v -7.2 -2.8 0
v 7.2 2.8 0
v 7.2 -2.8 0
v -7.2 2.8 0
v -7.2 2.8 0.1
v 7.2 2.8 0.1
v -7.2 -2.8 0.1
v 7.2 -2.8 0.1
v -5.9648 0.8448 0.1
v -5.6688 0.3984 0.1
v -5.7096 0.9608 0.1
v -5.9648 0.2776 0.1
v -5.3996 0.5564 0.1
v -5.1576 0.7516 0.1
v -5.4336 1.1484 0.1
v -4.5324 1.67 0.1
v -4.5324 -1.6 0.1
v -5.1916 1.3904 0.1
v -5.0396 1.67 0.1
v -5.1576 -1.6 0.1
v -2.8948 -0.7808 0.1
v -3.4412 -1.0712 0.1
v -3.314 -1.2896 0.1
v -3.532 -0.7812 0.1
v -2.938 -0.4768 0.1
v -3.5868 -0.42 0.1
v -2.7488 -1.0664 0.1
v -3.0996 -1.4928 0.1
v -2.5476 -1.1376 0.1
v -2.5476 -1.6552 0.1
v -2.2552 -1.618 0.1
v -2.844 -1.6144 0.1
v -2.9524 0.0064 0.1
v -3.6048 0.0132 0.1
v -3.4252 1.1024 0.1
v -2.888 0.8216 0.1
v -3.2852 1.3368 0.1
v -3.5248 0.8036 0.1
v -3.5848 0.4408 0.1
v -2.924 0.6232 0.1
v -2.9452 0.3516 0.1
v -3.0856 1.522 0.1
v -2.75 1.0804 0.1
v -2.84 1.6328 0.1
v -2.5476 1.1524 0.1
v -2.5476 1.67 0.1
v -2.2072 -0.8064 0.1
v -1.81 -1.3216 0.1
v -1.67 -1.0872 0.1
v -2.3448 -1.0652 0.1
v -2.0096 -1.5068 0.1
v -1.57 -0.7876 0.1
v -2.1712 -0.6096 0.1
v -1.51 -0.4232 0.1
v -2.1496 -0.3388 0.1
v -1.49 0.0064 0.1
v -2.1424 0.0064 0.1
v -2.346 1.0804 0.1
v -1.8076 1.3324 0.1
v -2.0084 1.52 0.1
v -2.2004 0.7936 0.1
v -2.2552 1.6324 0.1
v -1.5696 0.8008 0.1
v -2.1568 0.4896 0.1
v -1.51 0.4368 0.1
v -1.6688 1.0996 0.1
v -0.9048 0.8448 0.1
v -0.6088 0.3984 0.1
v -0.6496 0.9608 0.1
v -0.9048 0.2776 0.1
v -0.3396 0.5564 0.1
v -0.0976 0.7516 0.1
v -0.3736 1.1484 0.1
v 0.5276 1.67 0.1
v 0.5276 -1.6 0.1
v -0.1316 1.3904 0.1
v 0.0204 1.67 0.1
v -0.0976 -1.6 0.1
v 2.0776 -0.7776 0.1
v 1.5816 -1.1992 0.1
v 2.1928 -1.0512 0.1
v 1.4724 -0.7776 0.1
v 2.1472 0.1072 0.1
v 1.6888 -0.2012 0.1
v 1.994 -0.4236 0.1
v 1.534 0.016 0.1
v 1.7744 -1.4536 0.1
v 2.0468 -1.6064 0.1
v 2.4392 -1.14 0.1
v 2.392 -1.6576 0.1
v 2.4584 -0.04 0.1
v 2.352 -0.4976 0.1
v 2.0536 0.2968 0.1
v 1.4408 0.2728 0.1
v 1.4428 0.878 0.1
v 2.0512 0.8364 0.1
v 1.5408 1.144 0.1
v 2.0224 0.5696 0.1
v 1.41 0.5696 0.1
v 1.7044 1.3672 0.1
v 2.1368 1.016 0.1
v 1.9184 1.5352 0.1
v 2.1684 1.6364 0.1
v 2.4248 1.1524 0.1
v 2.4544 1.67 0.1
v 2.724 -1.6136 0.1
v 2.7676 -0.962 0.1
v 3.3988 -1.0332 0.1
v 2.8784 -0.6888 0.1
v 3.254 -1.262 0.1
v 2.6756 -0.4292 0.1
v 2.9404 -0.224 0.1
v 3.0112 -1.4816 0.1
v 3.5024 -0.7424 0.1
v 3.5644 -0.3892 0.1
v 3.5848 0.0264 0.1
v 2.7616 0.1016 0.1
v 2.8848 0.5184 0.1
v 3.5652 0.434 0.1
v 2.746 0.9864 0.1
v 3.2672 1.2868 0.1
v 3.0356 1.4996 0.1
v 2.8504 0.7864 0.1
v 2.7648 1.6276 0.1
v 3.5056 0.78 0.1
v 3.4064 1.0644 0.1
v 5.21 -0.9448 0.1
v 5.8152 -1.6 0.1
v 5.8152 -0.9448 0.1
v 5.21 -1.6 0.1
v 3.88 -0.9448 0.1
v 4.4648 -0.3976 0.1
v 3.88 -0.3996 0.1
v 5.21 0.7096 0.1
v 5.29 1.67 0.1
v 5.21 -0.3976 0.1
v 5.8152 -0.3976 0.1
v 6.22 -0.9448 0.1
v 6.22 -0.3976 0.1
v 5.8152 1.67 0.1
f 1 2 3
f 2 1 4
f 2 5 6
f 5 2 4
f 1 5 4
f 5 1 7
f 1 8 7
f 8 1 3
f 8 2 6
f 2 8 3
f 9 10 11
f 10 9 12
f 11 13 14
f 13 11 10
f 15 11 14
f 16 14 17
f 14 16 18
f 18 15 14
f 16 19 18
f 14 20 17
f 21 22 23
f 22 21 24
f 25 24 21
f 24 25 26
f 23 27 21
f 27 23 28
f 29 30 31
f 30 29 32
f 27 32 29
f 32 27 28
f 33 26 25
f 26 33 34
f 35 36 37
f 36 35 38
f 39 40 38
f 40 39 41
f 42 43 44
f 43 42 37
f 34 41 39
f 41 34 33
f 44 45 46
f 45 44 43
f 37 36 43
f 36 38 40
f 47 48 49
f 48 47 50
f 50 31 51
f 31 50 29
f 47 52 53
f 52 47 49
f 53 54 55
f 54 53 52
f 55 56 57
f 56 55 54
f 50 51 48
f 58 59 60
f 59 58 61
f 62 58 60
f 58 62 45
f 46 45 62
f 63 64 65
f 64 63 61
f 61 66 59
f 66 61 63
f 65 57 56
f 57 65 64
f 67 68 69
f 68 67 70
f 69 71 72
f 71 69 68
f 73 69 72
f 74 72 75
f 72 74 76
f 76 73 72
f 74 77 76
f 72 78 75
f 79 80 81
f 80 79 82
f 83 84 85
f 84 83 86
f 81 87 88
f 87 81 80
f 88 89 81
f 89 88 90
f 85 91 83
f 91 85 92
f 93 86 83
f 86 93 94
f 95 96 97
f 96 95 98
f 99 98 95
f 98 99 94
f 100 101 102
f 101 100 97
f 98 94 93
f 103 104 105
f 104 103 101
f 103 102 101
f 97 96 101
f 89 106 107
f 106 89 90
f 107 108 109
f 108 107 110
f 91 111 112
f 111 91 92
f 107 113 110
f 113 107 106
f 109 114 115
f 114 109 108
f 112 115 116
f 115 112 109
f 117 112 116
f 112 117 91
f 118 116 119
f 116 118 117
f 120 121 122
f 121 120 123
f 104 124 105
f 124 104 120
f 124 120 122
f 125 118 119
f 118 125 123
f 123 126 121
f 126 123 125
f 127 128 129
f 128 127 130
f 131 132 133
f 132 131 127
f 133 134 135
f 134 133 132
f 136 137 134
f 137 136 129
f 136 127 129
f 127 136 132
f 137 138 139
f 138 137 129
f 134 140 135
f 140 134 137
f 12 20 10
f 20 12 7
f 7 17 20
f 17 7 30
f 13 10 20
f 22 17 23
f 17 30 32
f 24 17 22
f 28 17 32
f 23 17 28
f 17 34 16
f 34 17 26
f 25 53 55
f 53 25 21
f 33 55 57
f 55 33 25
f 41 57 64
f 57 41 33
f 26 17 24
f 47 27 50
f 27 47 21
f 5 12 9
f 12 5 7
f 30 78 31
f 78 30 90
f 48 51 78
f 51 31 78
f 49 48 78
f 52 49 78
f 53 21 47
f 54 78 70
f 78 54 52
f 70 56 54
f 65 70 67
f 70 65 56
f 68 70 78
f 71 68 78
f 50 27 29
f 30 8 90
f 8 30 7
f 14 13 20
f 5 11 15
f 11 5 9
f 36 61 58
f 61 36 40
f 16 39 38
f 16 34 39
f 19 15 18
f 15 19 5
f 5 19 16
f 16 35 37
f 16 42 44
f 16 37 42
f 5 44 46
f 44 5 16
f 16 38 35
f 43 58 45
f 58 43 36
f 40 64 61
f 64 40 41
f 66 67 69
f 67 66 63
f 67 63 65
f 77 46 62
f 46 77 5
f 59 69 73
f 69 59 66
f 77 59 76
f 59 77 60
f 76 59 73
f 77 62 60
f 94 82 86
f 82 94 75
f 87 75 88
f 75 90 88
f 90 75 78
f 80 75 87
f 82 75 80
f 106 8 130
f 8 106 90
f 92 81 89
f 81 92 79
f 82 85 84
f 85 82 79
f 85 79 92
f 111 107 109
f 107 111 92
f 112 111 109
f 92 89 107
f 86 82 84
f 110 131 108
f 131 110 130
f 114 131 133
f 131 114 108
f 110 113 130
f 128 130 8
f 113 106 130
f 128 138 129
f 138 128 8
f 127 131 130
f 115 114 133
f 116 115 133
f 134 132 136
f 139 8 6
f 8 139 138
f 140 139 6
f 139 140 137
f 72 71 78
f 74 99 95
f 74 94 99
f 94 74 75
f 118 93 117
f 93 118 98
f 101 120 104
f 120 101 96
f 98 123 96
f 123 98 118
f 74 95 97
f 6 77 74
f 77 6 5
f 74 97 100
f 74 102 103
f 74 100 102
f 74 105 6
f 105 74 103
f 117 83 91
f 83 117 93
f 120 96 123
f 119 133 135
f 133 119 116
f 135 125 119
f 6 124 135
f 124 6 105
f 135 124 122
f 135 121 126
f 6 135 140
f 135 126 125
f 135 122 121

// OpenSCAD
// file: ../p/box5-12.scad
use <../lib.scad>
function ldraw_lib__box5_12() = [
// 0 Box with 5 Faces without Any Edges
// 0 Name: box5-12.dat
// 0 Author: Chris Dee [cwdee]
// 0 !LDRAW_ORG Primitive UPDATE 2009-02
// 0 !LICENSE Licensed under CC BY 2.0 and CC BY 4.0 : see CAreadme.txt
// 
// 0 BFC CERTIFY CCW
  [0,"BFC","CERTIFY"],
  [0,"BFC","CCW"],
// 
// 0 !HISTORY 2009-09-03 [PTadmin] Official Update 2009-02
// 
// 
// 4 16 1 1 1 1 1 -1 -1 1 -1 -1 1 1
  [4,16,1,1,1,1,1,-1,-1,1,-1,-1,1,1],
// 4 16 -1 0 1 1 0 1 1 1 1 -1 1 1
  [4,16,-1,0,1,1,0,1,1,1,1,-1,1,1],
// 4 16 -1 0 -1 -1 0 1 -1 1 1 -1 1 -1
  [4,16,-1,0,-1,-1,0,1,-1,1,1,-1,1,-1],
// 4 16 1 0 -1 -1 0 -1 -1 1 -1 1 1 -1
  [4,16,1,0,-1,-1,0,-1,-1,1,-1,1,1,-1],
// 4 16 1 0 1 1 0 -1 1 1 -1 1 1 1
  [4,16,1,0,1,1,0,-1,1,1,-1,1,1,1],
// 0
];
makepoly(ldraw_lib__box5_12(), line=0.2);
// main file
use <../lib.scad>
use <../p/box5-12.scad>
function ldraw_lib__4544258m() = [
// 0 Sticker  0.7 x  1.8 with White "10194"
// 0 Name: 4544258m.dat
// 0 Author: J.C. Tchang [tchang]
// 0 !LDRAW_ORG Part UPDATE 2012-03
// 0 !LICENSE Licensed under CC BY 2.0 and CC BY 4.0 : see CAreadme.txt
// 
// 0 BFC CERTIFY CCW
  [0,"BFC","CERTIFY"],
  [0,"BFC","CCW"],
// 
// 0 !KEYWORDS Emerald Night, set 10194, Train
// 
// 0 !HISTORY 2012-12-28 [PTadmin] Official Update 2012-03
// 
// 
// 1 16 0 -0.25 0 18 0 0 0 0.25 0 0 0 7 box5-12.dat
  [1,16,0,-0.25,0,18,0,0,0,0.25,0,0,0,7, ldraw_lib__box5_12()],
// 0 //
// 4 15 -14.912 -0.25 2.112 -14.912 -0.25 0.694 -14.172 -0.25 0.996 -14.274 -0.25 2.402
  [4,15,-14.912,-0.25,2.112,-14.912,-0.25,0.694,-14.172,-0.25,0.996,-14.274,-0.25,2.402],
// 4 15 -14.274 -0.25 2.402 -14.172 -0.25 0.996 -13.499 -0.25 1.391 -12.894 -0.25 1.879
  [4,15,-14.274,-0.25,2.402,-14.172,-0.25,0.996,-13.499,-0.25,1.391,-12.894,-0.25,1.879],
// 3 15 -13.584 -0.25 2.871 -14.274 -0.25 2.402 -12.894 -0.25 1.879
  [3,15,-13.584,-0.25,2.871,-14.274,-0.25,2.402,-12.894,-0.25,1.879],
// 4 15 -12.894 -0.25 1.879 -11.331 -0.25 -4 -11.331 -0.25 4.175 -12.979 -0.25 3.476
  [4,15,-12.894,-0.25,1.879,-11.331,-0.25,-4,-11.331,-0.25,4.175,-12.979,-0.25,3.476],
// 3 15 -12.979 -0.25 3.476 -13.584 -0.25 2.871 -12.894 -0.25 1.879
  [3,15,-12.979,-0.25,3.476,-13.584,-0.25,2.871,-12.894,-0.25,1.879],
// 3 15 -11.331 -0.25 4.175 -12.599 -0.25 4.175 -12.979 -0.25 3.476
  [3,15,-11.331,-0.25,4.175,-12.599,-0.25,4.175,-12.979,-0.25,3.476],
// 3 15 -12.894 -0.25 1.879 -12.894 -0.25 -4 -11.331 -0.25 -4
  [3,15,-12.894,-0.25,1.879,-12.894,-0.25,-4,-11.331,-0.25,-4],
// 4 15 -8.603 -0.25 -2.678 -8.285 -0.25 -3.224 -7.237 -0.25 -1.952 -8.83 -0.25 -1.953
  [4,15,-8.603,-0.25,-2.678,-8.285,-0.25,-3.224,-7.237,-0.25,-1.952,-8.83,-0.25,-1.953],
// 4 15 -7.345 -0.25 -1.192 -8.967 -0.25 -1.05 -8.83 -0.25 -1.953 -7.237 -0.25 -1.952
  [4,15,-7.345,-0.25,-1.192,-8.967,-0.25,-1.05,-8.83,-0.25,-1.953,-7.237,-0.25,-1.952],
// 4 15 -8.285 -0.25 -3.224 -7.749 -0.25 -3.732 -6.872 -0.25 -2.666 -7.237 -0.25 -1.952
  [4,15,-8.285,-0.25,-3.224,-7.749,-0.25,-3.732,-6.872,-0.25,-2.666,-7.237,-0.25,-1.952],
// 4 15 -6.369 -0.25 -2.844 -7.11 -0.25 -4.036 -6.369 -0.25 -4.138 -5.638 -0.25 -4.045
  [4,15,-6.369,-0.25,-2.844,-7.11,-0.25,-4.036,-6.369,-0.25,-4.138,-5.638,-0.25,-4.045],
// 4 15 -7.11 -0.25 -4.036 -6.369 -0.25 -2.844 -6.872 -0.25 -2.666 -7.749 -0.25 -3.732
  [4,15,-7.11,-0.25,-4.036,-6.369,-0.25,-2.844,-6.872,-0.25,-2.666,-7.749,-0.25,-3.732],
// 4 15 -8.967 -0.25 -1.05 -7.345 -0.25 -1.192 -7.381 -0.25 0.016 -9.012 -0.25 0.033
  [4,15,-8.967,-0.25,-1.05,-7.345,-0.25,-1.192,-7.381,-0.25,0.016,-9.012,-0.25,0.033],
// 4 15 -8.563 -0.25 2.756 -8.812 -0.25 2.009 -7.22 -0.25 2.054 -8.213 -0.25 3.342
  [4,15,-8.563,-0.25,2.756,-8.812,-0.25,2.009,-7.22,-0.25,2.054,-8.213,-0.25,3.342],
// 4 15 -7.31 -0.25 1.558 -8.812 -0.25 2.009 -8.962 -0.25 1.102 -7.363 -0.25 0.879
  [4,15,-7.31,-0.25,1.558,-8.812,-0.25,2.009,-8.962,-0.25,1.102,-7.363,-0.25,0.879],
// 4 15 -7.714 -0.25 3.805 -8.213 -0.25 3.342 -6.875 -0.25 2.701 -7.1 -0.25 4.082
  [4,15,-7.714,-0.25,3.805,-8.213,-0.25,3.342,-6.875,-0.25,2.701,-7.1,-0.25,4.082],
// 4 15 -7.363 -0.25 0.879 -8.962 -0.25 1.102 -9.012 -0.25 0.033 -7.381 -0.25 0.016
  [4,15,-7.363,-0.25,0.879,-8.962,-0.25,1.102,-9.012,-0.25,0.033,-7.381,-0.25,0.016],
// 4 15 -7.1 -0.25 4.082 -6.875 -0.25 2.701 -6.369 -0.25 2.881 -6.369 -0.25 4.175
  [4,15,-7.1,-0.25,4.082,-6.875,-0.25,2.701,-6.369,-0.25,2.881,-6.369,-0.25,4.175],
// 3 15 -8.213 -0.25 3.342 -7.22 -0.25 2.054 -6.875 -0.25 2.701
  [3,15,-8.213,-0.25,3.342,-7.22,-0.25,2.054,-6.875,-0.25,2.701],
// 3 15 -7.22 -0.25 2.054 -8.812 -0.25 2.009 -7.31 -0.25 1.558
  [3,15,-7.22,-0.25,2.054,-8.812,-0.25,2.009,-7.31,-0.25,1.558],
// 4 15 -5.518 -0.25 -2.016 -5.862 -0.25 -2.663 -4.525 -0.25 -3.304 -4.175 -0.25 -2.718
  [4,15,-5.518,-0.25,-2.016,-5.862,-0.25,-2.663,-4.525,-0.25,-3.304,-4.175,-0.25,-2.718],
// 4 15 -5.862 -0.25 -2.663 -6.369 -0.25 -2.844 -5.638 -0.25 -4.045 -5.024 -0.25 -3.767
  [4,15,-5.862,-0.25,-2.663,-6.369,-0.25,-2.844,-5.638,-0.25,-4.045,-5.024,-0.25,-3.767],
// 4 15 -3.925 -0.25 -1.969 -5.428 -0.25 -1.524 -5.518 -0.25 -2.016 -4.175 -0.25 -2.718
  [4,15,-3.925,-0.25,-1.969,-5.428,-0.25,-1.524,-5.518,-0.25,-2.016,-4.175,-0.25,-2.718],
// 4 15 -3.775 -0.25 -1.058 -5.374 -0.25 -0.847 -5.428 -0.25 -1.524 -3.925 -0.25 -1.969
  [4,15,-3.775,-0.25,-1.058,-5.374,-0.25,-0.847,-5.428,-0.25,-1.524,-3.925,-0.25,-1.969],
// 4 15 -3.725 -0.25 0.016 -5.356 -0.25 0.016 -5.374 -0.25 -0.847 -3.775 -0.25 -1.058
  [4,15,-3.725,-0.25,0.016,-5.356,-0.25,0.016,-5.374,-0.25,-0.847,-3.775,-0.25,-1.058],
// 3 15 -5.862 -0.25 -2.663 -5.024 -0.25 -3.767 -4.525 -0.25 -3.304
  [3,15,-5.862,-0.25,-2.663,-5.024,-0.25,-3.767,-4.525,-0.25,-3.304],
// 4 15 -5.865 -0.25 2.701 -5.501 -0.25 1.984 -4.519 -0.25 3.331 -5.021 -0.25 3.8
  [4,15,-5.865,-0.25,2.701,-5.501,-0.25,1.984,-4.519,-0.25,3.331,-5.021,-0.25,3.8],
// 4 15 -5.865 -0.25 2.701 -5.021 -0.25 3.8 -5.638 -0.25 4.081 -6.369 -0.25 2.881
  [4,15,-5.865,-0.25,2.701,-5.021,-0.25,3.8,-5.638,-0.25,4.081,-6.369,-0.25,2.881],
// 3 15 -6.369 -0.25 4.175 -6.369 -0.25 2.881 -5.638 -0.25 4.081
  [3,15,-6.369,-0.25,4.175,-6.369,-0.25,2.881,-5.638,-0.25,4.081],
// 4 15 -3.924 -0.25 2.002 -5.501 -0.25 1.984 -5.392 -0.25 1.224 -3.775 -0.25 1.092
  [4,15,-3.924,-0.25,2.002,-5.501,-0.25,1.984,-5.392,-0.25,1.224,-3.775,-0.25,1.092],
// 4 15 -5.501 -0.25 1.984 -3.924 -0.25 2.002 -4.172 -0.25 2.749 -4.519 -0.25 3.331
  [4,15,-5.501,-0.25,1.984,-3.924,-0.25,2.002,-4.172,-0.25,2.749,-4.519,-0.25,3.331],
// 4 15 -3.775 -0.25 1.092 -5.392 -0.25 1.224 -5.356 -0.25 0.016 -3.725 -0.25 0.016
  [4,15,-3.775,-0.25,1.092,-5.392,-0.25,1.224,-5.356,-0.25,0.016,-3.725,-0.25,0.016],
// 4 15 -2.262 -0.25 2.112 -2.262 -0.25 0.694 -1.522 -0.25 0.996 -1.624 -0.25 2.402
  [4,15,-2.262,-0.25,2.112,-2.262,-0.25,0.694,-1.522,-0.25,0.996,-1.624,-0.25,2.402],
// 4 15 -1.624 -0.25 2.402 -1.522 -0.25 0.996 -0.849 -0.25 1.391 -0.244 -0.25 1.879
  [4,15,-1.624,-0.25,2.402,-1.522,-0.25,0.996,-0.849,-0.25,1.391,-0.244,-0.25,1.879],
// 3 15 -0.934 -0.25 2.871 -1.624 -0.25 2.402 -0.244 -0.25 1.879
  [3,15,-0.934,-0.25,2.871,-1.624,-0.25,2.402,-0.244,-0.25,1.879],
// 4 15 -0.244 -0.25 1.879 1.319 -0.25 -4 1.319 -0.25 4.175 -0.329 -0.25 3.476
  [4,15,-0.244,-0.25,1.879,1.319,-0.25,-4,1.319,-0.25,4.175,-0.329,-0.25,3.476],
// 3 15 -0.329 -0.25 3.476 -0.934 -0.25 2.871 -0.244 -0.25 1.879
  [3,15,-0.329,-0.25,3.476,-0.934,-0.25,2.871,-0.244,-0.25,1.879],
// 3 15 1.319 -0.25 4.175 0.051 -0.25 4.175 -0.329 -0.25 3.476
  [3,15,1.319,-0.25,4.175,0.051,-0.25,4.175,-0.329,-0.25,3.476],
// 3 15 -0.244 -0.25 1.879 -0.244 -0.25 -4 1.319 -0.25 -4
  [3,15,-0.244,-0.25,1.879,-0.244,-0.25,-4,1.319,-0.25,-4],
// 4 15 5.194 -0.25 -1.944 3.681 -0.25 -1.944 3.954 -0.25 -2.998 5.482 -0.25 -2.628
  [4,15,5.194,-0.25,-1.944,3.681,-0.25,-1.944,3.954,-0.25,-2.998,5.482,-0.25,-2.628],
// 4 15 5.368 -0.25 0.268 3.835 -0.25 0.04 4.222 -0.25 -0.503 4.985 -0.25 -1.059
  [4,15,5.368,-0.25,0.268,3.835,-0.25,0.04,4.222,-0.25,-0.503,4.985,-0.25,-1.059],
// 4 15 5.482 -0.25 -2.628 3.954 -0.25 -2.998 4.436 -0.25 -3.634 5.117 -0.25 -4.016
  [4,15,5.482,-0.25,-2.628,3.954,-0.25,-2.998,4.436,-0.25,-3.634,5.117,-0.25,-4.016],
// 4 15 6.098 -0.25 -2.85 5.482 -0.25 -2.628 5.117 -0.25 -4.016 5.98 -0.25 -4.144
  [4,15,6.098,-0.25,-2.85,5.482,-0.25,-2.628,5.117,-0.25,-4.016,5.98,-0.25,-4.144],
// 4 15 6.146 -0.25 -0.1 5.368 -0.25 0.268 4.985 -0.25 -1.059 5.88 -0.25 -1.244
  [4,15,6.146,-0.25,-0.1,5.368,-0.25,0.268,4.985,-0.25,-1.059,5.88,-0.25,-1.244],
// 4 15 3.835 -0.25 0.04 5.368 -0.25 0.268 5.134 -0.25 0.742 3.602 -0.25 0.682
  [4,15,3.835,-0.25,0.04,5.368,-0.25,0.268,5.134,-0.25,0.742,3.602,-0.25,0.682],
// 4 15 5.128 -0.25 2.091 3.852 -0.25 2.86 3.607 -0.25 2.195 5.056 -0.25 1.424
  [4,15,5.128,-0.25,2.091,3.852,-0.25,2.86,3.607,-0.25,2.195,5.056,-0.25,1.424],
// 4 15 5.056 -0.25 1.424 3.607 -0.25 2.195 3.525 -0.25 1.424 3.602 -0.25 0.682
  [4,15,5.056,-0.25,1.424,3.607,-0.25,2.195,3.525,-0.25,1.424,3.602,-0.25,0.682],
// 4 15 4.261 -0.25 3.418 3.852 -0.25 2.86 5.342 -0.25 2.54 4.796 -0.25 3.838
  [4,15,4.261,-0.25,3.418,3.852,-0.25,2.86,5.342,-0.25,2.54,4.796,-0.25,3.838],
// 3 15 5.056 -0.25 1.424 3.602 -0.25 0.682 5.134 -0.25 0.742
  [3,15,5.056,-0.25,1.424,3.602,-0.25,0.682,5.134,-0.25,0.742],
// 4 15 5.421 -0.25 4.091 5.342 -0.25 2.54 6.062 -0.25 2.881 6.136 -0.25 4.175
  [4,15,5.421,-0.25,4.091,5.342,-0.25,2.54,6.062,-0.25,2.881,6.136,-0.25,4.175],
// 3 15 5.421 -0.25 4.091 4.796 -0.25 3.838 5.342 -0.25 2.54
  [3,15,5.421,-0.25,4.091,4.796,-0.25,3.838,5.342,-0.25,2.54],
// 3 15 3.852 -0.25 2.86 5.128 -0.25 2.091 5.342 -0.25 2.54
  [3,15,3.852,-0.25,2.86,5.128,-0.25,2.091,5.342,-0.25,2.54],
// 4 15 6.81 -0.25 -4.034 6.919 -0.25 -2.405 6.098 -0.25 -2.85 5.98 -0.25 -4.144
  [4,15,6.81,-0.25,-4.034,6.919,-0.25,-2.405,6.098,-0.25,-2.85,5.98,-0.25,-4.144],
// 4 15 8.497 -0.25 -2.583 7.196 -0.25 -1.722 6.919 -0.25 -2.405 8.135 -0.25 -3.155
  [4,15,8.497,-0.25,-2.583,7.196,-0.25,-1.722,6.919,-0.25,-2.405,8.135,-0.25,-3.155],
// 4 15 6.689 -0.25 -1.073 7.351 -0.25 -0.56 6.146 -0.25 -0.1 5.88 -0.25 -1.244
  [4,15,6.689,-0.25,-1.073,7.351,-0.25,-0.56,6.146,-0.25,-0.1,5.88,-0.25,-1.244],
// 4 15 6.919 -0.25 -2.405 6.81 -0.25 -4.034 7.528 -0.25 -3.704 8.135 -0.25 -3.155
  [4,15,6.919,-0.25,-2.405,6.81,-0.25,-4.034,7.528,-0.25,-3.704,8.135,-0.25,-3.155],
// 4 15 7.196 -0.25 -1.722 8.497 -0.25 -2.583 8.756 -0.25 -1.856 8.911 -0.25 -0.973
  [4,15,7.196,-0.25,-1.722,8.497,-0.25,-2.583,8.756,-0.25,-1.856,8.911,-0.25,-0.973],
// 4 15 7.351 -0.25 -0.56 7.196 -0.25 -1.722 8.911 -0.25 -0.973 8.962 -0.25 0.066
  [4,15,7.351,-0.25,-0.56,7.196,-0.25,-1.722,8.911,-0.25,-0.973,8.962,-0.25,0.066],
// 4 15 6.904 -0.25 0.254 6.146 -0.25 -0.1 7.351 -0.25 -0.56 8.962 -0.25 0.066
  [4,15,6.904,-0.25,0.254,6.146,-0.25,-0.1,7.351,-0.25,-0.56,8.962,-0.25,0.066],
// 4 15 7.212 -0.25 1.296 6.904 -0.25 0.254 8.962 -0.25 0.066 8.913 -0.25 1.085
  [4,15,7.212,-0.25,1.296,6.904,-0.25,0.254,8.962,-0.25,0.066,8.913,-0.25,1.085],
// 4 15 6.865 -0.25 2.466 7.126 -0.25 1.966 8.168 -0.25 3.217 7.589 -0.25 3.749
  [4,15,6.865,-0.25,2.466,7.126,-0.25,1.966,8.168,-0.25,3.217,7.589,-0.25,3.749],
// 4 15 6.912 -0.25 4.069 6.136 -0.25 4.175 6.062 -0.25 2.881 6.865 -0.25 2.466
  [4,15,6.912,-0.25,4.069,6.136,-0.25,4.175,6.062,-0.25,2.881,6.865,-0.25,2.466],
// 3 15 6.912 -0.25 4.069 6.865 -0.25 2.466 7.589 -0.25 3.749
  [3,15,6.912,-0.25,4.069,6.865,-0.25,2.466,7.589,-0.25,3.749],
// 4 15 8.764 -0.25 1.95 7.126 -0.25 1.966 7.212 -0.25 1.296 8.913 -0.25 1.085
  [4,15,8.764,-0.25,1.95,7.126,-0.25,1.966,7.212,-0.25,1.296,8.913,-0.25,1.085],
// 4 15 7.126 -0.25 1.966 8.764 -0.25 1.95 8.516 -0.25 2.661 8.168 -0.25 3.217
  [4,15,7.126,-0.25,1.966,8.764,-0.25,1.95,8.516,-0.25,2.661,8.168,-0.25,3.217],
// 4 15 13.025 -0.25 -2.362 13.025 -0.25 -4 14.538 -0.25 -4 14.538 -0.25 -2.362
  [4,15,13.025,-0.25,-2.362,13.025,-0.25,-4,14.538,-0.25,-4,14.538,-0.25,-2.362],
// 4 15 9.7 -0.25 -2.362 13.025 -0.25 -2.362 11.162 -0.25 -0.994 9.7 -0.25 -0.999
  [4,15,9.7,-0.25,-2.362,13.025,-0.25,-2.362,11.162,-0.25,-0.994,9.7,-0.25,-0.999],
// 4 15 9.7 -0.25 -0.999 11.162 -0.25 -0.994 13.025 -0.25 1.774 13.225 -0.25 4.175
  [4,15,9.7,-0.25,-0.999,11.162,-0.25,-0.994,13.025,-0.25,1.774,13.225,-0.25,4.175],
// 4 15 14.538 -0.25 -0.994 13.025 -0.25 1.774 13.025 -0.25 -0.994 14.538 -0.25 -2.362
  [4,15,14.538,-0.25,-0.994,13.025,-0.25,1.774,13.025,-0.25,-0.994,14.538,-0.25,-2.362],
// 4 15 13.025 -0.25 -0.994 11.162 -0.25 -0.994 13.025 -0.25 -2.362 14.538 -0.25 -2.362
  [4,15,13.025,-0.25,-0.994,11.162,-0.25,-0.994,13.025,-0.25,-2.362,14.538,-0.25,-2.362],
// 4 15 14.538 -0.25 -2.362 15.55 -0.25 -2.362 15.55 -0.25 -0.994 14.538 -0.25 -0.994
  [4,15,14.538,-0.25,-2.362,15.55,-0.25,-2.362,15.55,-0.25,-0.994,14.538,-0.25,-0.994],
// 4 15 14.538 -0.25 4.175 13.225 -0.25 4.175 13.025 -0.25 1.774 14.538 -0.25 -0.994
  [4,15,14.538,-0.25,4.175,13.225,-0.25,4.175,13.025,-0.25,1.774,14.538,-0.25,-0.994],
// 0 //
// 4 16 -14.912 -0.25 0.694 -18 -0.25 -7 -12.894 -0.25 -4 -14.172 -0.25 0.996
  [4,16,-14.912,-0.25,0.694,-18,-0.25,-7,-12.894,-0.25,-4,-14.172,-0.25,0.996],
// 4 16 -11.331 -0.25 -4 -12.894 -0.25 -4 -18 -0.25 -7 -6.369 -0.25 -4.138
  [4,16,-11.331,-0.25,-4,-12.894,-0.25,-4,-18,-0.25,-7,-6.369,-0.25,-4.138],
// 3 16 -13.499 -0.25 1.391 -14.172 -0.25 0.996 -12.894 -0.25 -4
  [3,16,-13.499,-0.25,1.391,-14.172,-0.25,0.996,-12.894,-0.25,-4],
// 3 16 -8.603 -0.25 -2.678 -11.331 -0.25 -4 -8.285 -0.25 -3.224
  [3,16,-8.603,-0.25,-2.678,-11.331,-0.25,-4,-8.285,-0.25,-3.224],
// 3 16 -11.331 -0.25 -4 -6.369 -0.25 -4.138 -7.11 -0.25 -4.036
  [3,16,-11.331,-0.25,-4,-6.369,-0.25,-4.138,-7.11,-0.25,-4.036],
// 3 16 -8.83 -0.25 -1.953 -11.331 -0.25 -4 -8.603 -0.25 -2.678
  [3,16,-8.83,-0.25,-1.953,-11.331,-0.25,-4,-8.603,-0.25,-2.678],
// 3 16 -7.749 -0.25 -3.732 -11.331 -0.25 -4 -7.11 -0.25 -4.036
  [3,16,-7.749,-0.25,-3.732,-11.331,-0.25,-4,-7.11,-0.25,-4.036],
// 3 16 -8.285 -0.25 -3.224 -11.331 -0.25 -4 -7.749 -0.25 -3.732
  [3,16,-8.285,-0.25,-3.224,-11.331,-0.25,-4,-7.749,-0.25,-3.732],
// 4 16 -9.012 -0.25 0.033 -11.331 -0.25 4.175 -11.331 -0.25 -4 -8.967 -0.25 -1.05
  [4,16,-9.012,-0.25,0.033,-11.331,-0.25,4.175,-11.331,-0.25,-4,-8.967,-0.25,-1.05],
// 4 16 -7.345 -0.25 -1.192 -7.237 -0.25 -1.952 -5.428 -0.25 -1.524 -5.374 -0.25 -0.847
  [4,16,-7.345,-0.25,-1.192,-7.237,-0.25,-1.952,-5.428,-0.25,-1.524,-5.374,-0.25,-0.847],
// 4 16 -7.381 -0.25 0.016 -7.345 -0.25 -1.192 -5.374 -0.25 -0.847 -5.356 -0.25 0.016
  [4,16,-7.381,-0.25,0.016,-7.345,-0.25,-1.192,-5.374,-0.25,-0.847,-5.356,-0.25,0.016],
// 4 16 -7.363 -0.25 0.879 -7.381 -0.25 0.016 -5.356 -0.25 0.016 -5.392 -0.25 1.224
  [4,16,-7.363,-0.25,0.879,-7.381,-0.25,0.016,-5.356,-0.25,0.016,-5.392,-0.25,1.224],
// 3 16 -8.967 -0.25 -1.05 -11.331 -0.25 -4 -8.83 -0.25 -1.953
  [3,16,-8.967,-0.25,-1.05,-11.331,-0.25,-4,-8.83,-0.25,-1.953],
// 4 16 -5.518 -0.25 -2.016 -7.237 -0.25 -1.952 -6.872 -0.25 -2.666 -5.862 -0.25 -2.663
  [4,16,-5.518,-0.25,-2.016,-7.237,-0.25,-1.952,-6.872,-0.25,-2.666,-5.862,-0.25,-2.663],
// 4 16 -18 -0.25 7 -18 -0.25 -7 -14.912 -0.25 0.694 -14.912 -0.25 2.112
  [4,16,-18,-0.25,7,-18,-0.25,-7,-14.912,-0.25,0.694,-14.912,-0.25,2.112],
// 4 16 -0.244 -0.25 -4 -5.638 -0.25 -4.045 -6.369 -0.25 -4.138 5.98 -0.25 -4.144
  [4,16,-0.244,-0.25,-4,-5.638,-0.25,-4.045,-6.369,-0.25,-4.138,5.98,-0.25,-4.144],
// 3 16 -4.525 -0.25 -3.304 -5.024 -0.25 -3.767 -0.244 -0.25 -4
  [3,16,-4.525,-0.25,-3.304,-5.024,-0.25,-3.767,-0.244,-0.25,-4],
// 3 16 -5.024 -0.25 -3.767 -5.638 -0.25 -4.045 -0.244 -0.25 -4
  [3,16,-5.024,-0.25,-3.767,-5.638,-0.25,-4.045,-0.244,-0.25,-4],
// 3 16 -4.175 -0.25 -2.718 -4.525 -0.25 -3.304 -0.244 -0.25 -4
  [3,16,-4.175,-0.25,-2.718,-4.525,-0.25,-3.304,-0.244,-0.25,-4],
// 3 16 -3.925 -0.25 -1.969 -4.175 -0.25 -2.718 -0.244 -0.25 -4
  [3,16,-3.925,-0.25,-1.969,-4.175,-0.25,-2.718,-0.244,-0.25,-4],
// 3 16 -5.428 -0.25 -1.524 -7.237 -0.25 -1.952 -5.518 -0.25 -2.016
  [3,16,-5.428,-0.25,-1.524,-7.237,-0.25,-1.952,-5.518,-0.25,-2.016],
// 4 16 -3.775 -0.25 -1.058 -3.925 -0.25 -1.969 -0.244 -0.25 -4 -2.262 -0.25 0.694
  [4,16,-3.775,-0.25,-1.058,-3.925,-0.25,-1.969,-0.244,-0.25,-4,-2.262,-0.25,0.694],
// 3 16 -2.262 -0.25 0.694 -3.725 -0.25 0.016 -3.775 -0.25 -1.058
  [3,16,-2.262,-0.25,0.694,-3.725,-0.25,0.016,-3.775,-0.25,-1.058],
// 4 16 -3.775 -0.25 1.092 -3.725 -0.25 0.016 -2.262 -0.25 0.694 -2.262 -0.25 2.112
  [4,16,-3.775,-0.25,1.092,-3.725,-0.25,0.016,-2.262,-0.25,0.694,-2.262,-0.25,2.112],
// 3 16 -1.522 -0.25 0.996 -2.262 -0.25 0.694 -0.244 -0.25 -4
  [3,16,-1.522,-0.25,0.996,-2.262,-0.25,0.694,-0.244,-0.25,-4],
// 3 16 -0.849 -0.25 1.391 -1.522 -0.25 0.996 -0.244 -0.25 -4
  [3,16,-0.849,-0.25,1.391,-1.522,-0.25,0.996,-0.244,-0.25,-4],
// 3 16 -5.862 -0.25 -2.663 -6.872 -0.25 -2.666 -6.369 -0.25 -2.844
  [3,16,-5.862,-0.25,-2.663,-6.872,-0.25,-2.666,-6.369,-0.25,-2.844],
// 4 16 5.98 -0.25 -4.144 -6.369 -0.25 -4.138 -18 -0.25 -7 18 -0.25 -7
  [4,16,5.98,-0.25,-4.144,-6.369,-0.25,-4.138,-18,-0.25,-7,18,-0.25,-7],
// 3 16 -12.894 -0.25 1.879 -13.499 -0.25 1.391 -12.894 -0.25 -4
  [3,16,-12.894,-0.25,1.879,-13.499,-0.25,1.391,-12.894,-0.25,-4],
// 4 16 -18 -0.25 7 -14.912 -0.25 2.112 -14.274 -0.25 2.402 -13.584 -0.25 2.871
  [4,16,-18,-0.25,7,-14.912,-0.25,2.112,-14.274,-0.25,2.402,-13.584,-0.25,2.871],
// 4 16 -7.22 -0.25 2.054 -7.31 -0.25 1.558 -5.501 -0.25 1.984 -5.865 -0.25 2.701
  [4,16,-7.22,-0.25,2.054,-7.31,-0.25,1.558,-5.501,-0.25,1.984,-5.865,-0.25,2.701],
// 3 16 -11.331 -0.25 4.175 -8.962 -0.25 1.102 -8.812 -0.25 2.009
  [3,16,-11.331,-0.25,4.175,-8.962,-0.25,1.102,-8.812,-0.25,2.009],
// 3 16 -11.331 -0.25 4.175 -9.012 -0.25 0.033 -8.962 -0.25 1.102
  [3,16,-11.331,-0.25,4.175,-9.012,-0.25,0.033,-8.962,-0.25,1.102],
// 4 16 -18 -0.25 7 -13.584 -0.25 2.871 -12.979 -0.25 3.476 -12.599 -0.25 4.175
  [4,16,-18,-0.25,7,-13.584,-0.25,2.871,-12.979,-0.25,3.476,-12.599,-0.25,4.175],
// 3 16 -18 -0.25 7 -12.599 -0.25 4.175 -11.331 -0.25 4.175
  [3,16,-18,-0.25,7,-12.599,-0.25,4.175,-11.331,-0.25,4.175],
// 3 16 -11.331 -0.25 4.175 -8.563 -0.25 2.756 -8.213 -0.25 3.342
  [3,16,-11.331,-0.25,4.175,-8.563,-0.25,2.756,-8.213,-0.25,3.342],
// 3 16 -11.331 -0.25 4.175 -7.714 -0.25 3.805 -7.1 -0.25 4.082
  [3,16,-11.331,-0.25,4.175,-7.714,-0.25,3.805,-7.1,-0.25,4.082],
// 3 16 -11.331 -0.25 4.175 -8.213 -0.25 3.342 -7.714 -0.25 3.805
  [3,16,-11.331,-0.25,4.175,-8.213,-0.25,3.342,-7.714,-0.25,3.805],
// 4 16 -6.369 -0.25 4.175 -18 -0.25 7 -11.331 -0.25 4.175 -7.1 -0.25 4.082
  [4,16,-6.369,-0.25,4.175,-18,-0.25,7,-11.331,-0.25,4.175,-7.1,-0.25,4.082],
// 3 16 -11.331 -0.25 4.175 -8.812 -0.25 2.009 -8.563 -0.25 2.756
  [3,16,-11.331,-0.25,4.175,-8.812,-0.25,2.009,-8.563,-0.25,2.756],
// 4 16 -6.875 -0.25 2.701 -7.22 -0.25 2.054 -5.865 -0.25 2.701 -6.369 -0.25 2.881
  [4,16,-6.875,-0.25,2.701,-7.22,-0.25,2.054,-5.865,-0.25,2.701,-6.369,-0.25,2.881],
// 4 16 -5.392 -0.25 1.224 -5.501 -0.25 1.984 -7.31 -0.25 1.558 -7.363 -0.25 0.879
  [4,16,-5.392,-0.25,1.224,-5.501,-0.25,1.984,-7.31,-0.25,1.558,-7.363,-0.25,0.879],
// 4 16 -4.172 -0.25 2.749 -3.924 -0.25 2.002 -2.262 -0.25 2.112 -1.624 -0.25 2.402
  [4,16,-4.172,-0.25,2.749,-3.924,-0.25,2.002,-2.262,-0.25,2.112,-1.624,-0.25,2.402],
// 3 16 -2.262 -0.25 2.112 -3.924 -0.25 2.002 -3.775 -0.25 1.092
  [3,16,-2.262,-0.25,2.112,-3.924,-0.25,2.002,-3.775,-0.25,1.092],
// 4 16 -6.369 -0.25 4.175 -5.638 -0.25 4.081 0.051 -0.25 4.175 -18 -0.25 7
  [4,16,-6.369,-0.25,4.175,-5.638,-0.25,4.081,0.051,-0.25,4.175,-18,-0.25,7],
// 4 16 -4.519 -0.25 3.331 -4.172 -0.25 2.749 -1.624 -0.25 2.402 -0.934 -0.25 2.871
  [4,16,-4.519,-0.25,3.331,-4.172,-0.25,2.749,-1.624,-0.25,2.402,-0.934,-0.25,2.871],
// 4 16 0.051 -0.25 4.175 -5.021 -0.25 3.8 -4.519 -0.25 3.331 -0.329 -0.25 3.476
  [4,16,0.051,-0.25,4.175,-5.021,-0.25,3.8,-4.519,-0.25,3.331,-0.329,-0.25,3.476],
// 3 16 -0.329 -0.25 3.476 -4.519 -0.25 3.331 -0.934 -0.25 2.871
  [3,16,-0.329,-0.25,3.476,-4.519,-0.25,3.331,-0.934,-0.25,2.871],
// 3 16 0.051 -0.25 4.175 -5.638 -0.25 4.081 -5.021 -0.25 3.8
  [3,16,0.051,-0.25,4.175,-5.638,-0.25,4.081,-5.021,-0.25,3.8],
// 4 16 3.835 -0.25 0.04 3.602 -0.25 0.682 1.319 -0.25 -4 3.681 -0.25 -1.944
  [4,16,3.835,-0.25,0.04,3.602,-0.25,0.682,1.319,-0.25,-4,3.681,-0.25,-1.944],
// 3 16 4.436 -0.25 -3.634 1.319 -0.25 -4 5.117 -0.25 -4.016
  [3,16,4.436,-0.25,-3.634,1.319,-0.25,-4,5.117,-0.25,-4.016],
// 4 16 5.98 -0.25 -4.144 5.117 -0.25 -4.016 1.319 -0.25 -4 -0.244 -0.25 -4
  [4,16,5.98,-0.25,-4.144,5.117,-0.25,-4.016,1.319,-0.25,-4,-0.244,-0.25,-4],
// 3 16 3.954 -0.25 -2.998 1.319 -0.25 -4 4.436 -0.25 -3.634
  [3,16,3.954,-0.25,-2.998,1.319,-0.25,-4,4.436,-0.25,-3.634],
// 3 16 3.681 -0.25 -1.944 1.319 -0.25 -4 3.954 -0.25 -2.998
  [3,16,3.681,-0.25,-1.944,1.319,-0.25,-4,3.954,-0.25,-2.998],
// 4 16 13.025 -0.25 -4 6.81 -0.25 -4.034 5.98 -0.25 -4.144 18 -0.25 -7
  [4,16,13.025,-0.25,-4,6.81,-0.25,-4.034,5.98,-0.25,-4.144,18,-0.25,-7],
// 4 16 5.482 -0.25 -2.628 6.098 -0.25 -2.85 5.88 -0.25 -1.244 5.194 -0.25 -1.944
  [4,16,5.482,-0.25,-2.628,6.098,-0.25,-2.85,5.88,-0.25,-1.244,5.194,-0.25,-1.944],
// 4 16 3.681 -0.25 -1.944 5.194 -0.25 -1.944 4.985 -0.25 -1.059 4.222 -0.25 -0.503
  [4,16,3.681,-0.25,-1.944,5.194,-0.25,-1.944,4.985,-0.25,-1.059,4.222,-0.25,-0.503],
// 3 16 4.985 -0.25 -1.059 5.194 -0.25 -1.944 5.88 -0.25 -1.244
  [3,16,4.985,-0.25,-1.059,5.194,-0.25,-1.944,5.88,-0.25,-1.244],
// 4 16 5.88 -0.25 -1.244 6.919 -0.25 -2.405 7.196 -0.25 -1.722 6.689 -0.25 -1.073
  [4,16,5.88,-0.25,-1.244,6.919,-0.25,-2.405,7.196,-0.25,-1.722,6.689,-0.25,-1.073],
// 3 16 7.351 -0.25 -0.56 6.689 -0.25 -1.073 7.196 -0.25 -1.722
  [3,16,7.351,-0.25,-0.56,6.689,-0.25,-1.073,7.196,-0.25,-1.722],
// 3 16 5.88 -0.25 -1.244 6.098 -0.25 -2.85 6.919 -0.25 -2.405
  [3,16,5.88,-0.25,-1.244,6.098,-0.25,-2.85,6.919,-0.25,-2.405],
// 3 16 3.835 -0.25 0.04 3.681 -0.25 -1.944 4.222 -0.25 -0.503
  [3,16,3.835,-0.25,0.04,3.681,-0.25,-1.944,4.222,-0.25,-0.503],
// 4 16 8.135 -0.25 -3.155 13.025 -0.25 -4 9.7 -0.25 -2.362 8.497 -0.25 -2.583
  [4,16,8.135,-0.25,-3.155,13.025,-0.25,-4,9.7,-0.25,-2.362,8.497,-0.25,-2.583],
// 4 16 8.756 -0.25 -1.856 8.497 -0.25 -2.583 9.7 -0.25 -2.362 9.7 -0.25 -0.999
  [4,16,8.756,-0.25,-1.856,8.497,-0.25,-2.583,9.7,-0.25,-2.362,9.7,-0.25,-0.999],
// 3 16 8.135 -0.25 -3.155 7.528 -0.25 -3.704 13.025 -0.25 -4
  [3,16,8.135,-0.25,-3.155,7.528,-0.25,-3.704,13.025,-0.25,-4],
// 3 16 14.538 -0.25 -4 13.025 -0.25 -4 18 -0.25 -7
  [3,16,14.538,-0.25,-4,13.025,-0.25,-4,18,-0.25,-7],
// 3 16 7.528 -0.25 -3.704 6.81 -0.25 -4.034 13.025 -0.25 -4
  [3,16,7.528,-0.25,-3.704,6.81,-0.25,-4.034,13.025,-0.25,-4],
// 4 16 14.538 -0.25 -4 18 -0.25 -7 15.55 -0.25 -2.362 14.538 -0.25 -2.362
  [4,16,14.538,-0.25,-4,18,-0.25,-7,15.55,-0.25,-2.362,14.538,-0.25,-2.362],
// 3 16 13.025 -0.25 -2.362 9.7 -0.25 -2.362 13.025 -0.25 -4
  [3,16,13.025,-0.25,-2.362,9.7,-0.25,-2.362,13.025,-0.25,-4],
// 3 16 8.911 -0.25 -0.973 8.756 -0.25 -1.856 9.7 -0.25 -0.999
  [3,16,8.911,-0.25,-0.973,8.756,-0.25,-1.856,9.7,-0.25,-0.999],
// 3 16 8.962 -0.25 0.066 8.911 -0.25 -0.973 9.7 -0.25 -0.999
  [3,16,8.962,-0.25,0.066,8.911,-0.25,-0.973,9.7,-0.25,-0.999],
// 3 16 13.025 -0.25 1.774 11.162 -0.25 -0.994 13.025 -0.25 -0.994
  [3,16,13.025,-0.25,1.774,11.162,-0.25,-0.994,13.025,-0.25,-0.994],
// 4 16 15.55 -0.25 -0.994 15.55 -0.25 -2.362 18 -0.25 -7 18 -0.25 7
  [4,16,15.55,-0.25,-0.994,15.55,-0.25,-2.362,18,-0.25,-7,18,-0.25,7],
// 4 16 14.538 -0.25 4.175 14.538 -0.25 -0.994 15.55 -0.25 -0.994 18 -0.25 7
  [4,16,14.538,-0.25,4.175,14.538,-0.25,-0.994,15.55,-0.25,-0.994,18,-0.25,7],
// 3 16 -0.244 -0.25 1.879 -0.849 -0.25 1.391 -0.244 -0.25 -4
  [3,16,-0.244,-0.25,1.879,-0.849,-0.25,1.391,-0.244,-0.25,-4],
// 3 16 1.319 -0.25 4.175 3.525 -0.25 1.424 3.607 -0.25 2.195
  [3,16,1.319,-0.25,4.175,3.525,-0.25,1.424,3.607,-0.25,2.195],
// 4 16 3.602 -0.25 0.682 3.525 -0.25 1.424 1.319 -0.25 4.175 1.319 -0.25 -4
  [4,16,3.602,-0.25,0.682,3.525,-0.25,1.424,1.319,-0.25,4.175,1.319,-0.25,-4],
// 4 16 7.212 -0.25 1.296 5.056 -0.25 1.424 5.134 -0.25 0.742 6.904 -0.25 0.254
  [4,16,7.212,-0.25,1.296,5.056,-0.25,1.424,5.134,-0.25,0.742,6.904,-0.25,0.254],
// 4 16 5.342 -0.25 2.54 5.128 -0.25 2.091 6.865 -0.25 2.466 6.062 -0.25 2.881
  [4,16,5.342,-0.25,2.54,5.128,-0.25,2.091,6.865,-0.25,2.466,6.062,-0.25,2.881],
// 4 16 7.126 -0.25 1.966 5.128 -0.25 2.091 5.056 -0.25 1.424 7.212 -0.25 1.296
  [4,16,7.126,-0.25,1.966,5.128,-0.25,2.091,5.056,-0.25,1.424,7.212,-0.25,1.296],
// 3 16 1.319 -0.25 4.175 3.607 -0.25 2.195 3.852 -0.25 2.86
  [3,16,1.319,-0.25,4.175,3.607,-0.25,2.195,3.852,-0.25,2.86],
// 4 16 0.051 -0.25 4.175 1.319 -0.25 4.175 18 -0.25 7 -18 -0.25 7
  [4,16,0.051,-0.25,4.175,1.319,-0.25,4.175,18,-0.25,7,-18,-0.25,7],
// 3 16 1.319 -0.25 4.175 3.852 -0.25 2.86 4.261 -0.25 3.418
  [3,16,1.319,-0.25,4.175,3.852,-0.25,2.86,4.261,-0.25,3.418],
// 3 16 1.319 -0.25 4.175 4.796 -0.25 3.838 5.421 -0.25 4.091
  [3,16,1.319,-0.25,4.175,4.796,-0.25,3.838,5.421,-0.25,4.091],
// 3 16 1.319 -0.25 4.175 4.261 -0.25 3.418 4.796 -0.25 3.838
  [3,16,1.319,-0.25,4.175,4.261,-0.25,3.418,4.796,-0.25,3.838],
// 4 16 1.319 -0.25 4.175 5.421 -0.25 4.091 6.136 -0.25 4.175 18 -0.25 7
  [4,16,1.319,-0.25,4.175,5.421,-0.25,4.091,6.136,-0.25,4.175,18,-0.25,7],
// 4 16 6.904 -0.25 0.254 5.134 -0.25 0.742 5.368 -0.25 0.268 6.146 -0.25 -0.1
  [4,16,6.904,-0.25,0.254,5.134,-0.25,0.742,5.368,-0.25,0.268,6.146,-0.25,-0.1],
// 3 16 6.865 -0.25 2.466 5.128 -0.25 2.091 7.126 -0.25 1.966
  [3,16,6.865,-0.25,2.466,5.128,-0.25,2.091,7.126,-0.25,1.966],
// 4 16 8.913 -0.25 1.085 8.962 -0.25 0.066 9.7 -0.25 -0.999 13.225 -0.25 4.175
  [4,16,8.913,-0.25,1.085,8.962,-0.25,0.066,9.7,-0.25,-0.999,13.225,-0.25,4.175],
// 3 16 13.225 -0.25 4.175 8.764 -0.25 1.95 8.913 -0.25 1.085
  [3,16,13.225,-0.25,4.175,8.764,-0.25,1.95,8.913,-0.25,1.085],
// 4 16 6.136 -0.25 4.175 6.912 -0.25 4.069 13.225 -0.25 4.175 18 -0.25 7
  [4,16,6.136,-0.25,4.175,6.912,-0.25,4.069,13.225,-0.25,4.175,18,-0.25,7],
// 3 16 13.225 -0.25 4.175 6.912 -0.25 4.069 7.589 -0.25 3.749
  [3,16,13.225,-0.25,4.175,6.912,-0.25,4.069,7.589,-0.25,3.749],
// 3 16 13.225 -0.25 4.175 8.168 -0.25 3.217 8.516 -0.25 2.661
  [3,16,13.225,-0.25,4.175,8.168,-0.25,3.217,8.516,-0.25,2.661],
// 3 16 18 -0.25 7 13.225 -0.25 4.175 14.538 -0.25 4.175
  [3,16,18,-0.25,7,13.225,-0.25,4.175,14.538,-0.25,4.175],
// 3 16 13.225 -0.25 4.175 8.516 -0.25 2.661 8.764 -0.25 1.95
  [3,16,13.225,-0.25,4.175,8.516,-0.25,2.661,8.764,-0.25,1.95],
// 3 16 13.225 -0.25 4.175 7.589 -0.25 3.749 8.168 -0.25 3.217
  [3,16,13.225,-0.25,4.175,7.589,-0.25,3.749,8.168,-0.25,3.217],
];
makepoly(ldraw_lib__4544258m(), line=0.2);
